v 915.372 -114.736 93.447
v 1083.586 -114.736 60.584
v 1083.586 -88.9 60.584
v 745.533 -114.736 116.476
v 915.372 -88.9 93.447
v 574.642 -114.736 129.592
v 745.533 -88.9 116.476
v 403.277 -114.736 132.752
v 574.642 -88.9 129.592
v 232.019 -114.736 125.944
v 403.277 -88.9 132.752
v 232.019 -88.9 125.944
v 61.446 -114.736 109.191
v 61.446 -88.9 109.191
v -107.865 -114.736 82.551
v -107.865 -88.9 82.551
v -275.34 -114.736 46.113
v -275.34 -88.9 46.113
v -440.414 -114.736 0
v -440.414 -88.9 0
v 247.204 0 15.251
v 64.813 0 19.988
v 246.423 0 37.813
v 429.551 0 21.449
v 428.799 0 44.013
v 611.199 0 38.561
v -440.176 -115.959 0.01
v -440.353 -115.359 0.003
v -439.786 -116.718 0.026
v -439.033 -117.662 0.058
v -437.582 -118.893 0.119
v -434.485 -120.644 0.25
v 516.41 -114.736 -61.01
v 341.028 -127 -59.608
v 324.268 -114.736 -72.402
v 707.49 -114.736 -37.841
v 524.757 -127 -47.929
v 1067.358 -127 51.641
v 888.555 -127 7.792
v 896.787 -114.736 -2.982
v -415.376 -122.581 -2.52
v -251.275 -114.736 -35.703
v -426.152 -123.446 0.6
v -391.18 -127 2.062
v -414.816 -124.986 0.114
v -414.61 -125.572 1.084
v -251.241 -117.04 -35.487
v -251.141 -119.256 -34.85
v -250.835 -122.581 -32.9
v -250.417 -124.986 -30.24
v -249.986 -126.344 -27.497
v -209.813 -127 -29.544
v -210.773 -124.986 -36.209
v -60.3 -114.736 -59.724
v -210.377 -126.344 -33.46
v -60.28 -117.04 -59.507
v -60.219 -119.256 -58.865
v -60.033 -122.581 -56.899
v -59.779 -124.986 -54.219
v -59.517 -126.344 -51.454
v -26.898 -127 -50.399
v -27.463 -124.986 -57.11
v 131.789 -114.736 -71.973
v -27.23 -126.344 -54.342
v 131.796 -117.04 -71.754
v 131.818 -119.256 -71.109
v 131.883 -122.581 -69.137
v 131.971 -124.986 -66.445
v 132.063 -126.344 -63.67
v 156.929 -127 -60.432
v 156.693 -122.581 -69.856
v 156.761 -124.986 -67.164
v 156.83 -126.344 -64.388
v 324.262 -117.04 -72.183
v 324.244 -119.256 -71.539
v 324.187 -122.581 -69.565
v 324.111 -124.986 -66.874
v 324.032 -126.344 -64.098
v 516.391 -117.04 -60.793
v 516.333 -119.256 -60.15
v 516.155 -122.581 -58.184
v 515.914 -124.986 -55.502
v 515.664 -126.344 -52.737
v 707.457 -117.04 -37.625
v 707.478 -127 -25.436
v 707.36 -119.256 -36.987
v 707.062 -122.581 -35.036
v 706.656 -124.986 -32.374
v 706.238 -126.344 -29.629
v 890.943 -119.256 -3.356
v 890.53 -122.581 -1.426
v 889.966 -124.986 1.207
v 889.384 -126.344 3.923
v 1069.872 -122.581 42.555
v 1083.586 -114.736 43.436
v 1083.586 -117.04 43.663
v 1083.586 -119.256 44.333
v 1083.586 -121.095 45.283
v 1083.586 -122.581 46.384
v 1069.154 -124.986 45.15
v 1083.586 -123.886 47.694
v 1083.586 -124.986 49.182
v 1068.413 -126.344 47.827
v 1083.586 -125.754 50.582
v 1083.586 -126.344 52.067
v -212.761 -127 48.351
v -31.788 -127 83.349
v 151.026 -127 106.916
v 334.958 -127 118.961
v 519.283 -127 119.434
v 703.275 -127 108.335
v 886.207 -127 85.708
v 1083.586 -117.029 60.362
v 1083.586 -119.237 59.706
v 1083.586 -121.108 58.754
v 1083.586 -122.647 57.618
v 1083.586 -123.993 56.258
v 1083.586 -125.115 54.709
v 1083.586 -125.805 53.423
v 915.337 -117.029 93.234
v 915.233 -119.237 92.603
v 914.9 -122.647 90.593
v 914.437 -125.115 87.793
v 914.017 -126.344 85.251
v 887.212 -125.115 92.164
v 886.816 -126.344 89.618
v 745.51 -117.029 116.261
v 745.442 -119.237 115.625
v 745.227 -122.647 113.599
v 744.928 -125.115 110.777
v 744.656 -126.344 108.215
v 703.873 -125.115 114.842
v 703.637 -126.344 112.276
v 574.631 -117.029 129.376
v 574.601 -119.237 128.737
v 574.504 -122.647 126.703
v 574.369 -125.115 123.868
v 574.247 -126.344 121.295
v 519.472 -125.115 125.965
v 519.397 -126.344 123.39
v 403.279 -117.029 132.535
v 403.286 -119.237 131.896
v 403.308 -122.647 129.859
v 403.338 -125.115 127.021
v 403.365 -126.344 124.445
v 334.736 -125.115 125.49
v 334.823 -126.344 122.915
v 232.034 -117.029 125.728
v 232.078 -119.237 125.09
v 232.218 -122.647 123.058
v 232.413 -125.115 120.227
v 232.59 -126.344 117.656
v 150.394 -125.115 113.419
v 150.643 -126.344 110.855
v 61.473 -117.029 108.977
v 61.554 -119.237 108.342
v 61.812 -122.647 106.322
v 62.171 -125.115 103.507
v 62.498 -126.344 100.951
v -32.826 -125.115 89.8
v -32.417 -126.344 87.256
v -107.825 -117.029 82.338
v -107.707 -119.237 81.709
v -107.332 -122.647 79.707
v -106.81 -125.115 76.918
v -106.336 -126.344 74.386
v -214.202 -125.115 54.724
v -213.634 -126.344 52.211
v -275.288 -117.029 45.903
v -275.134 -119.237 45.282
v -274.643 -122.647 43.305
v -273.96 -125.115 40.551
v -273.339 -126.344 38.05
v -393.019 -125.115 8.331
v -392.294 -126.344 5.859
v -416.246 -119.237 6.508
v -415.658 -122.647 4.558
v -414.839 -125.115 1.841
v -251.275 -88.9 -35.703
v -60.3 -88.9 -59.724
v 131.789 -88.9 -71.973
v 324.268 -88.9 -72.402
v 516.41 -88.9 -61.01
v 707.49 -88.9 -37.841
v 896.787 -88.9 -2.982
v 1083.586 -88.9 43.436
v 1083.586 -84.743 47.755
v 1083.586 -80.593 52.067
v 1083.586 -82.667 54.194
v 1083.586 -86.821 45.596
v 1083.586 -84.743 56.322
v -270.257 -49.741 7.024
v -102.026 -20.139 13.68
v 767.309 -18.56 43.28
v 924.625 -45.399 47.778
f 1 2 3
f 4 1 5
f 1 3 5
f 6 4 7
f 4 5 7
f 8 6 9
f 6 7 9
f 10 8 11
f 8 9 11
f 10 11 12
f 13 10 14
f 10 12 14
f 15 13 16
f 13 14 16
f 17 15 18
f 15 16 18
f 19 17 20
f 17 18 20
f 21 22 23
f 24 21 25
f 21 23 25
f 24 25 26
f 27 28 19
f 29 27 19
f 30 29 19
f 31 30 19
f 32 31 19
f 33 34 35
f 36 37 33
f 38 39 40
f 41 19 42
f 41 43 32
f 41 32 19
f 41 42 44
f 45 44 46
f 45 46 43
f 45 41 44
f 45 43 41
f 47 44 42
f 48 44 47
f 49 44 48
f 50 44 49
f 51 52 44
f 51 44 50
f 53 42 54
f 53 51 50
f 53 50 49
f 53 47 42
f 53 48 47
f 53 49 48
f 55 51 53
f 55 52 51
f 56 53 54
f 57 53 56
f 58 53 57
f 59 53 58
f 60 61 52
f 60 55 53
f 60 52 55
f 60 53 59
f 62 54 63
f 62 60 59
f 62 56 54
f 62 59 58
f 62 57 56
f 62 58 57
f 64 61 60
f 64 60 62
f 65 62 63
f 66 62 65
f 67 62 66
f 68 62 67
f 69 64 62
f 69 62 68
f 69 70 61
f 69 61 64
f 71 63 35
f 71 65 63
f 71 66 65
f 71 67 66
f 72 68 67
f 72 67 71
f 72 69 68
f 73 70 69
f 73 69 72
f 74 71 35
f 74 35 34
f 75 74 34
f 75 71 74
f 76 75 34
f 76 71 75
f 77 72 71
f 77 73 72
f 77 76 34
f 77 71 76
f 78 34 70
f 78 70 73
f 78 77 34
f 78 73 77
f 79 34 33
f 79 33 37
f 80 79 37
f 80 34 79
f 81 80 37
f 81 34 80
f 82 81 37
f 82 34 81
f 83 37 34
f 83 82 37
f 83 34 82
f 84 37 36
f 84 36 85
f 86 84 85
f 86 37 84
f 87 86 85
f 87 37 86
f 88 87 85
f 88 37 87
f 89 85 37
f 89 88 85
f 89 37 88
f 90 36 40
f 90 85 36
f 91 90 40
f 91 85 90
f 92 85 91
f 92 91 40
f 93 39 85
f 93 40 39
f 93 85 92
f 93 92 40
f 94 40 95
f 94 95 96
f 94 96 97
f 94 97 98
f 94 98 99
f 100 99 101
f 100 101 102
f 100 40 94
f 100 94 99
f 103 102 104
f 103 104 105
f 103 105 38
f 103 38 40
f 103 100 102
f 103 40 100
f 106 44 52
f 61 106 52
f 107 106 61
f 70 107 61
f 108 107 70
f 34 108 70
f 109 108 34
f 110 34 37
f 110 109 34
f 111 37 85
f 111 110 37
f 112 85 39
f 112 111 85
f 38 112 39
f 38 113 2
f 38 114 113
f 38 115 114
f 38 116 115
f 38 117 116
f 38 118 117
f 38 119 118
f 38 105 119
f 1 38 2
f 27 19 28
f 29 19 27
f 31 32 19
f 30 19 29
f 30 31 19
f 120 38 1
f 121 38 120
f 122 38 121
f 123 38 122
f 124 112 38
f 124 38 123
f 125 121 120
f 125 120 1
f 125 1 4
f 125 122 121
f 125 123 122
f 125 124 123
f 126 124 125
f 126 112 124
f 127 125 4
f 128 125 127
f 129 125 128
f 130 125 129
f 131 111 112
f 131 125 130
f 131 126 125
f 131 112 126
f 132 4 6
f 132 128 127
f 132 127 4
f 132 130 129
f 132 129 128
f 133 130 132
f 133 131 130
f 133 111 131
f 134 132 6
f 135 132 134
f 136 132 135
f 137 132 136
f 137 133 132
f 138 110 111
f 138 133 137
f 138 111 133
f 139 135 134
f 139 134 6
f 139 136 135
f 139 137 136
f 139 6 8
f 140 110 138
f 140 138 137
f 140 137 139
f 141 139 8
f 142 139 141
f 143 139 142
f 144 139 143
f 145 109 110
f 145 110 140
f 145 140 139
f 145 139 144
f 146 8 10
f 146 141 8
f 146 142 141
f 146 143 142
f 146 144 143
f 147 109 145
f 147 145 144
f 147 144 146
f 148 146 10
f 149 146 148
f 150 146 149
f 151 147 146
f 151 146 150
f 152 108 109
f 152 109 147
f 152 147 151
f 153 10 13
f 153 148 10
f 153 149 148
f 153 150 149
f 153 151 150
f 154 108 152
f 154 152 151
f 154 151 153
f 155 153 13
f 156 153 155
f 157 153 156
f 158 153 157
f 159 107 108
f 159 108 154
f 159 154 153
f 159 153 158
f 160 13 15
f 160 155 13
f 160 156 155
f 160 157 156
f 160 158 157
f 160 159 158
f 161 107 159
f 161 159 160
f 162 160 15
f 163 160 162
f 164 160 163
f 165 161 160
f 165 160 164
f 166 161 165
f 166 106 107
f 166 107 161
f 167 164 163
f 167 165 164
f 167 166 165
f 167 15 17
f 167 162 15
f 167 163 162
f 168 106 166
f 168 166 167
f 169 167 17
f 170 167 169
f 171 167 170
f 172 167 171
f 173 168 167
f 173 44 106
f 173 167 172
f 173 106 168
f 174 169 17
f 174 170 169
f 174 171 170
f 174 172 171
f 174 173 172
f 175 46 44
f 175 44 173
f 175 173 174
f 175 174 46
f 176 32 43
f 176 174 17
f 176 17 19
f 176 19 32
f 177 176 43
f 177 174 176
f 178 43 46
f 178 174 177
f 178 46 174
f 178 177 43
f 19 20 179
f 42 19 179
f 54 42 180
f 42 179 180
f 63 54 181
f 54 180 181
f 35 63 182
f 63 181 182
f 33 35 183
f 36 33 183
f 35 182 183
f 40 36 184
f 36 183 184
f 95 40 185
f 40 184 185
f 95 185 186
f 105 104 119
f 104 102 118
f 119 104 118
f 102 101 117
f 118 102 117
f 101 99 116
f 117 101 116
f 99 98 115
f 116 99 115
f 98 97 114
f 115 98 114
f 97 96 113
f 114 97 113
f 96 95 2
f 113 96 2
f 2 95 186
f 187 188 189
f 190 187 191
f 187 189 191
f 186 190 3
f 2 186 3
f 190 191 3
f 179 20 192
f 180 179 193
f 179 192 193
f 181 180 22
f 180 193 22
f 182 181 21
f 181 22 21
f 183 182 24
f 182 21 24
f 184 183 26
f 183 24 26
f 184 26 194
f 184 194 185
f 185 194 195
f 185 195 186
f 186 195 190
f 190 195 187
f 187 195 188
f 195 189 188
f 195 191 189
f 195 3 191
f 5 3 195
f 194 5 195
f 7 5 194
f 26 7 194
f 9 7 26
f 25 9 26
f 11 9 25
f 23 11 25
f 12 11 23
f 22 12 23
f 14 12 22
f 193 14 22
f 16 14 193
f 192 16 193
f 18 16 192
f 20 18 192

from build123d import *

# Parameters (mm, degrees)
F1_DEPTH    = 127
F2_T2_ANGLE = 31.186938852
F2_T4_ANGLE = 29.2868339597
F3_C1_SIZE  = 88.9
F3_C2_SIZE  = 88.9


# Not quite as in the source:
# - a fillet or chamfer that OpenCascade refuses, or shapes differently, is made with other operations: its cross-section is extruded or revolved along the edge and cut away or added


with BuildPart() as f1:
    # F0 (on Front) → F1 (new body)
    with BuildSketch(Plane.XZ):
        with BuildLine():
            Line((1083.5856187426, 43.4364019366), (1083.5856187426, 60.5836437908))
            ThreePointArc((1083.5856187426, 60.5836437908), (317.5983414893, 130.5929948501), (-440.4143812574, 0))
            ThreePointArc((-440.4143812574, 0), (324.2681839508, -72.4016891466), (1083.5856187426, 43.4364019366))
        make_face()
    extrude(amount=F1_DEPTH)

    # F2: fillet of radius 12.2642048969 on 3 edges, made by hand

    # F2_s1 → F2_t2 (revolve, cut)
    with BuildSketch(Plane(origin=(1042.3525858454, 0, -246.7280237768), x_dir=(0, 1, 0), z_dir=(0.973110628, 0, -0.230338242))):
        with BuildLine():
            ThreePointArc((-114.7357951031, 308.7053036416), (-123.4078975516, 305.1132011932), (-127, 296.4410987447))
            Line((-127, 296.4410987447), (-127, 308.7053036416))
            Line((-127, 308.7053036416), (-114.7357951031, 308.7053036416))
        make_face()
    revolve(axis=Axis((434.657275986, -127, -2814.0601328001), (0, -1, 0)), revolution_arc=F2_T2_ANGLE, mode=Mode.SUBTRACT)

    # F2_s3 → F2_t4 (revolve, cut)
    with BuildSketch(Plane(origin=(-447.9656433365, 0, 103.5102824727), x_dir=(0, 1, 0), z_dir=(-0.9743274922, 0, 0.2251353769))):
        with BuildLine():
            ThreePointArc((-114.7357951031, 99.3028983442), (-123.4078975516, 95.7107958958), (-127, 87.0386934473))
            Line((-127, 87.0386934473), (-127, 99.3028983442))
            Line((-127, 99.3028983442), (-114.7357951031, 99.3028983442))
        make_face()
    revolve(axis=Axis((235.0110043049, -127, 3059.2559923266), (0, -1, 0)), revolution_arc=F2_T4_ANGLE, mode=Mode.SUBTRACT)

    # F3: chamfer of 88.9 on 2 edges, made by hand

    # F3_c1
    f3_c1_edges = [f1.edges().sort_by_distance(p)[0] for p in [
        (317.5983414893, 0, 130.5929948501),
    ]]
    chamfer(f3_c1_edges, length=F3_C1_SIZE)

    # F3_c2
    f3_c2_edges = [f1.edges().sort_by_distance(p)[0] for p in [
        (341.4443406907, 0, -71.8649927128),
    ]]
    chamfer(f3_c2_edges, length=F3_C2_SIZE)


solid = f1.part
